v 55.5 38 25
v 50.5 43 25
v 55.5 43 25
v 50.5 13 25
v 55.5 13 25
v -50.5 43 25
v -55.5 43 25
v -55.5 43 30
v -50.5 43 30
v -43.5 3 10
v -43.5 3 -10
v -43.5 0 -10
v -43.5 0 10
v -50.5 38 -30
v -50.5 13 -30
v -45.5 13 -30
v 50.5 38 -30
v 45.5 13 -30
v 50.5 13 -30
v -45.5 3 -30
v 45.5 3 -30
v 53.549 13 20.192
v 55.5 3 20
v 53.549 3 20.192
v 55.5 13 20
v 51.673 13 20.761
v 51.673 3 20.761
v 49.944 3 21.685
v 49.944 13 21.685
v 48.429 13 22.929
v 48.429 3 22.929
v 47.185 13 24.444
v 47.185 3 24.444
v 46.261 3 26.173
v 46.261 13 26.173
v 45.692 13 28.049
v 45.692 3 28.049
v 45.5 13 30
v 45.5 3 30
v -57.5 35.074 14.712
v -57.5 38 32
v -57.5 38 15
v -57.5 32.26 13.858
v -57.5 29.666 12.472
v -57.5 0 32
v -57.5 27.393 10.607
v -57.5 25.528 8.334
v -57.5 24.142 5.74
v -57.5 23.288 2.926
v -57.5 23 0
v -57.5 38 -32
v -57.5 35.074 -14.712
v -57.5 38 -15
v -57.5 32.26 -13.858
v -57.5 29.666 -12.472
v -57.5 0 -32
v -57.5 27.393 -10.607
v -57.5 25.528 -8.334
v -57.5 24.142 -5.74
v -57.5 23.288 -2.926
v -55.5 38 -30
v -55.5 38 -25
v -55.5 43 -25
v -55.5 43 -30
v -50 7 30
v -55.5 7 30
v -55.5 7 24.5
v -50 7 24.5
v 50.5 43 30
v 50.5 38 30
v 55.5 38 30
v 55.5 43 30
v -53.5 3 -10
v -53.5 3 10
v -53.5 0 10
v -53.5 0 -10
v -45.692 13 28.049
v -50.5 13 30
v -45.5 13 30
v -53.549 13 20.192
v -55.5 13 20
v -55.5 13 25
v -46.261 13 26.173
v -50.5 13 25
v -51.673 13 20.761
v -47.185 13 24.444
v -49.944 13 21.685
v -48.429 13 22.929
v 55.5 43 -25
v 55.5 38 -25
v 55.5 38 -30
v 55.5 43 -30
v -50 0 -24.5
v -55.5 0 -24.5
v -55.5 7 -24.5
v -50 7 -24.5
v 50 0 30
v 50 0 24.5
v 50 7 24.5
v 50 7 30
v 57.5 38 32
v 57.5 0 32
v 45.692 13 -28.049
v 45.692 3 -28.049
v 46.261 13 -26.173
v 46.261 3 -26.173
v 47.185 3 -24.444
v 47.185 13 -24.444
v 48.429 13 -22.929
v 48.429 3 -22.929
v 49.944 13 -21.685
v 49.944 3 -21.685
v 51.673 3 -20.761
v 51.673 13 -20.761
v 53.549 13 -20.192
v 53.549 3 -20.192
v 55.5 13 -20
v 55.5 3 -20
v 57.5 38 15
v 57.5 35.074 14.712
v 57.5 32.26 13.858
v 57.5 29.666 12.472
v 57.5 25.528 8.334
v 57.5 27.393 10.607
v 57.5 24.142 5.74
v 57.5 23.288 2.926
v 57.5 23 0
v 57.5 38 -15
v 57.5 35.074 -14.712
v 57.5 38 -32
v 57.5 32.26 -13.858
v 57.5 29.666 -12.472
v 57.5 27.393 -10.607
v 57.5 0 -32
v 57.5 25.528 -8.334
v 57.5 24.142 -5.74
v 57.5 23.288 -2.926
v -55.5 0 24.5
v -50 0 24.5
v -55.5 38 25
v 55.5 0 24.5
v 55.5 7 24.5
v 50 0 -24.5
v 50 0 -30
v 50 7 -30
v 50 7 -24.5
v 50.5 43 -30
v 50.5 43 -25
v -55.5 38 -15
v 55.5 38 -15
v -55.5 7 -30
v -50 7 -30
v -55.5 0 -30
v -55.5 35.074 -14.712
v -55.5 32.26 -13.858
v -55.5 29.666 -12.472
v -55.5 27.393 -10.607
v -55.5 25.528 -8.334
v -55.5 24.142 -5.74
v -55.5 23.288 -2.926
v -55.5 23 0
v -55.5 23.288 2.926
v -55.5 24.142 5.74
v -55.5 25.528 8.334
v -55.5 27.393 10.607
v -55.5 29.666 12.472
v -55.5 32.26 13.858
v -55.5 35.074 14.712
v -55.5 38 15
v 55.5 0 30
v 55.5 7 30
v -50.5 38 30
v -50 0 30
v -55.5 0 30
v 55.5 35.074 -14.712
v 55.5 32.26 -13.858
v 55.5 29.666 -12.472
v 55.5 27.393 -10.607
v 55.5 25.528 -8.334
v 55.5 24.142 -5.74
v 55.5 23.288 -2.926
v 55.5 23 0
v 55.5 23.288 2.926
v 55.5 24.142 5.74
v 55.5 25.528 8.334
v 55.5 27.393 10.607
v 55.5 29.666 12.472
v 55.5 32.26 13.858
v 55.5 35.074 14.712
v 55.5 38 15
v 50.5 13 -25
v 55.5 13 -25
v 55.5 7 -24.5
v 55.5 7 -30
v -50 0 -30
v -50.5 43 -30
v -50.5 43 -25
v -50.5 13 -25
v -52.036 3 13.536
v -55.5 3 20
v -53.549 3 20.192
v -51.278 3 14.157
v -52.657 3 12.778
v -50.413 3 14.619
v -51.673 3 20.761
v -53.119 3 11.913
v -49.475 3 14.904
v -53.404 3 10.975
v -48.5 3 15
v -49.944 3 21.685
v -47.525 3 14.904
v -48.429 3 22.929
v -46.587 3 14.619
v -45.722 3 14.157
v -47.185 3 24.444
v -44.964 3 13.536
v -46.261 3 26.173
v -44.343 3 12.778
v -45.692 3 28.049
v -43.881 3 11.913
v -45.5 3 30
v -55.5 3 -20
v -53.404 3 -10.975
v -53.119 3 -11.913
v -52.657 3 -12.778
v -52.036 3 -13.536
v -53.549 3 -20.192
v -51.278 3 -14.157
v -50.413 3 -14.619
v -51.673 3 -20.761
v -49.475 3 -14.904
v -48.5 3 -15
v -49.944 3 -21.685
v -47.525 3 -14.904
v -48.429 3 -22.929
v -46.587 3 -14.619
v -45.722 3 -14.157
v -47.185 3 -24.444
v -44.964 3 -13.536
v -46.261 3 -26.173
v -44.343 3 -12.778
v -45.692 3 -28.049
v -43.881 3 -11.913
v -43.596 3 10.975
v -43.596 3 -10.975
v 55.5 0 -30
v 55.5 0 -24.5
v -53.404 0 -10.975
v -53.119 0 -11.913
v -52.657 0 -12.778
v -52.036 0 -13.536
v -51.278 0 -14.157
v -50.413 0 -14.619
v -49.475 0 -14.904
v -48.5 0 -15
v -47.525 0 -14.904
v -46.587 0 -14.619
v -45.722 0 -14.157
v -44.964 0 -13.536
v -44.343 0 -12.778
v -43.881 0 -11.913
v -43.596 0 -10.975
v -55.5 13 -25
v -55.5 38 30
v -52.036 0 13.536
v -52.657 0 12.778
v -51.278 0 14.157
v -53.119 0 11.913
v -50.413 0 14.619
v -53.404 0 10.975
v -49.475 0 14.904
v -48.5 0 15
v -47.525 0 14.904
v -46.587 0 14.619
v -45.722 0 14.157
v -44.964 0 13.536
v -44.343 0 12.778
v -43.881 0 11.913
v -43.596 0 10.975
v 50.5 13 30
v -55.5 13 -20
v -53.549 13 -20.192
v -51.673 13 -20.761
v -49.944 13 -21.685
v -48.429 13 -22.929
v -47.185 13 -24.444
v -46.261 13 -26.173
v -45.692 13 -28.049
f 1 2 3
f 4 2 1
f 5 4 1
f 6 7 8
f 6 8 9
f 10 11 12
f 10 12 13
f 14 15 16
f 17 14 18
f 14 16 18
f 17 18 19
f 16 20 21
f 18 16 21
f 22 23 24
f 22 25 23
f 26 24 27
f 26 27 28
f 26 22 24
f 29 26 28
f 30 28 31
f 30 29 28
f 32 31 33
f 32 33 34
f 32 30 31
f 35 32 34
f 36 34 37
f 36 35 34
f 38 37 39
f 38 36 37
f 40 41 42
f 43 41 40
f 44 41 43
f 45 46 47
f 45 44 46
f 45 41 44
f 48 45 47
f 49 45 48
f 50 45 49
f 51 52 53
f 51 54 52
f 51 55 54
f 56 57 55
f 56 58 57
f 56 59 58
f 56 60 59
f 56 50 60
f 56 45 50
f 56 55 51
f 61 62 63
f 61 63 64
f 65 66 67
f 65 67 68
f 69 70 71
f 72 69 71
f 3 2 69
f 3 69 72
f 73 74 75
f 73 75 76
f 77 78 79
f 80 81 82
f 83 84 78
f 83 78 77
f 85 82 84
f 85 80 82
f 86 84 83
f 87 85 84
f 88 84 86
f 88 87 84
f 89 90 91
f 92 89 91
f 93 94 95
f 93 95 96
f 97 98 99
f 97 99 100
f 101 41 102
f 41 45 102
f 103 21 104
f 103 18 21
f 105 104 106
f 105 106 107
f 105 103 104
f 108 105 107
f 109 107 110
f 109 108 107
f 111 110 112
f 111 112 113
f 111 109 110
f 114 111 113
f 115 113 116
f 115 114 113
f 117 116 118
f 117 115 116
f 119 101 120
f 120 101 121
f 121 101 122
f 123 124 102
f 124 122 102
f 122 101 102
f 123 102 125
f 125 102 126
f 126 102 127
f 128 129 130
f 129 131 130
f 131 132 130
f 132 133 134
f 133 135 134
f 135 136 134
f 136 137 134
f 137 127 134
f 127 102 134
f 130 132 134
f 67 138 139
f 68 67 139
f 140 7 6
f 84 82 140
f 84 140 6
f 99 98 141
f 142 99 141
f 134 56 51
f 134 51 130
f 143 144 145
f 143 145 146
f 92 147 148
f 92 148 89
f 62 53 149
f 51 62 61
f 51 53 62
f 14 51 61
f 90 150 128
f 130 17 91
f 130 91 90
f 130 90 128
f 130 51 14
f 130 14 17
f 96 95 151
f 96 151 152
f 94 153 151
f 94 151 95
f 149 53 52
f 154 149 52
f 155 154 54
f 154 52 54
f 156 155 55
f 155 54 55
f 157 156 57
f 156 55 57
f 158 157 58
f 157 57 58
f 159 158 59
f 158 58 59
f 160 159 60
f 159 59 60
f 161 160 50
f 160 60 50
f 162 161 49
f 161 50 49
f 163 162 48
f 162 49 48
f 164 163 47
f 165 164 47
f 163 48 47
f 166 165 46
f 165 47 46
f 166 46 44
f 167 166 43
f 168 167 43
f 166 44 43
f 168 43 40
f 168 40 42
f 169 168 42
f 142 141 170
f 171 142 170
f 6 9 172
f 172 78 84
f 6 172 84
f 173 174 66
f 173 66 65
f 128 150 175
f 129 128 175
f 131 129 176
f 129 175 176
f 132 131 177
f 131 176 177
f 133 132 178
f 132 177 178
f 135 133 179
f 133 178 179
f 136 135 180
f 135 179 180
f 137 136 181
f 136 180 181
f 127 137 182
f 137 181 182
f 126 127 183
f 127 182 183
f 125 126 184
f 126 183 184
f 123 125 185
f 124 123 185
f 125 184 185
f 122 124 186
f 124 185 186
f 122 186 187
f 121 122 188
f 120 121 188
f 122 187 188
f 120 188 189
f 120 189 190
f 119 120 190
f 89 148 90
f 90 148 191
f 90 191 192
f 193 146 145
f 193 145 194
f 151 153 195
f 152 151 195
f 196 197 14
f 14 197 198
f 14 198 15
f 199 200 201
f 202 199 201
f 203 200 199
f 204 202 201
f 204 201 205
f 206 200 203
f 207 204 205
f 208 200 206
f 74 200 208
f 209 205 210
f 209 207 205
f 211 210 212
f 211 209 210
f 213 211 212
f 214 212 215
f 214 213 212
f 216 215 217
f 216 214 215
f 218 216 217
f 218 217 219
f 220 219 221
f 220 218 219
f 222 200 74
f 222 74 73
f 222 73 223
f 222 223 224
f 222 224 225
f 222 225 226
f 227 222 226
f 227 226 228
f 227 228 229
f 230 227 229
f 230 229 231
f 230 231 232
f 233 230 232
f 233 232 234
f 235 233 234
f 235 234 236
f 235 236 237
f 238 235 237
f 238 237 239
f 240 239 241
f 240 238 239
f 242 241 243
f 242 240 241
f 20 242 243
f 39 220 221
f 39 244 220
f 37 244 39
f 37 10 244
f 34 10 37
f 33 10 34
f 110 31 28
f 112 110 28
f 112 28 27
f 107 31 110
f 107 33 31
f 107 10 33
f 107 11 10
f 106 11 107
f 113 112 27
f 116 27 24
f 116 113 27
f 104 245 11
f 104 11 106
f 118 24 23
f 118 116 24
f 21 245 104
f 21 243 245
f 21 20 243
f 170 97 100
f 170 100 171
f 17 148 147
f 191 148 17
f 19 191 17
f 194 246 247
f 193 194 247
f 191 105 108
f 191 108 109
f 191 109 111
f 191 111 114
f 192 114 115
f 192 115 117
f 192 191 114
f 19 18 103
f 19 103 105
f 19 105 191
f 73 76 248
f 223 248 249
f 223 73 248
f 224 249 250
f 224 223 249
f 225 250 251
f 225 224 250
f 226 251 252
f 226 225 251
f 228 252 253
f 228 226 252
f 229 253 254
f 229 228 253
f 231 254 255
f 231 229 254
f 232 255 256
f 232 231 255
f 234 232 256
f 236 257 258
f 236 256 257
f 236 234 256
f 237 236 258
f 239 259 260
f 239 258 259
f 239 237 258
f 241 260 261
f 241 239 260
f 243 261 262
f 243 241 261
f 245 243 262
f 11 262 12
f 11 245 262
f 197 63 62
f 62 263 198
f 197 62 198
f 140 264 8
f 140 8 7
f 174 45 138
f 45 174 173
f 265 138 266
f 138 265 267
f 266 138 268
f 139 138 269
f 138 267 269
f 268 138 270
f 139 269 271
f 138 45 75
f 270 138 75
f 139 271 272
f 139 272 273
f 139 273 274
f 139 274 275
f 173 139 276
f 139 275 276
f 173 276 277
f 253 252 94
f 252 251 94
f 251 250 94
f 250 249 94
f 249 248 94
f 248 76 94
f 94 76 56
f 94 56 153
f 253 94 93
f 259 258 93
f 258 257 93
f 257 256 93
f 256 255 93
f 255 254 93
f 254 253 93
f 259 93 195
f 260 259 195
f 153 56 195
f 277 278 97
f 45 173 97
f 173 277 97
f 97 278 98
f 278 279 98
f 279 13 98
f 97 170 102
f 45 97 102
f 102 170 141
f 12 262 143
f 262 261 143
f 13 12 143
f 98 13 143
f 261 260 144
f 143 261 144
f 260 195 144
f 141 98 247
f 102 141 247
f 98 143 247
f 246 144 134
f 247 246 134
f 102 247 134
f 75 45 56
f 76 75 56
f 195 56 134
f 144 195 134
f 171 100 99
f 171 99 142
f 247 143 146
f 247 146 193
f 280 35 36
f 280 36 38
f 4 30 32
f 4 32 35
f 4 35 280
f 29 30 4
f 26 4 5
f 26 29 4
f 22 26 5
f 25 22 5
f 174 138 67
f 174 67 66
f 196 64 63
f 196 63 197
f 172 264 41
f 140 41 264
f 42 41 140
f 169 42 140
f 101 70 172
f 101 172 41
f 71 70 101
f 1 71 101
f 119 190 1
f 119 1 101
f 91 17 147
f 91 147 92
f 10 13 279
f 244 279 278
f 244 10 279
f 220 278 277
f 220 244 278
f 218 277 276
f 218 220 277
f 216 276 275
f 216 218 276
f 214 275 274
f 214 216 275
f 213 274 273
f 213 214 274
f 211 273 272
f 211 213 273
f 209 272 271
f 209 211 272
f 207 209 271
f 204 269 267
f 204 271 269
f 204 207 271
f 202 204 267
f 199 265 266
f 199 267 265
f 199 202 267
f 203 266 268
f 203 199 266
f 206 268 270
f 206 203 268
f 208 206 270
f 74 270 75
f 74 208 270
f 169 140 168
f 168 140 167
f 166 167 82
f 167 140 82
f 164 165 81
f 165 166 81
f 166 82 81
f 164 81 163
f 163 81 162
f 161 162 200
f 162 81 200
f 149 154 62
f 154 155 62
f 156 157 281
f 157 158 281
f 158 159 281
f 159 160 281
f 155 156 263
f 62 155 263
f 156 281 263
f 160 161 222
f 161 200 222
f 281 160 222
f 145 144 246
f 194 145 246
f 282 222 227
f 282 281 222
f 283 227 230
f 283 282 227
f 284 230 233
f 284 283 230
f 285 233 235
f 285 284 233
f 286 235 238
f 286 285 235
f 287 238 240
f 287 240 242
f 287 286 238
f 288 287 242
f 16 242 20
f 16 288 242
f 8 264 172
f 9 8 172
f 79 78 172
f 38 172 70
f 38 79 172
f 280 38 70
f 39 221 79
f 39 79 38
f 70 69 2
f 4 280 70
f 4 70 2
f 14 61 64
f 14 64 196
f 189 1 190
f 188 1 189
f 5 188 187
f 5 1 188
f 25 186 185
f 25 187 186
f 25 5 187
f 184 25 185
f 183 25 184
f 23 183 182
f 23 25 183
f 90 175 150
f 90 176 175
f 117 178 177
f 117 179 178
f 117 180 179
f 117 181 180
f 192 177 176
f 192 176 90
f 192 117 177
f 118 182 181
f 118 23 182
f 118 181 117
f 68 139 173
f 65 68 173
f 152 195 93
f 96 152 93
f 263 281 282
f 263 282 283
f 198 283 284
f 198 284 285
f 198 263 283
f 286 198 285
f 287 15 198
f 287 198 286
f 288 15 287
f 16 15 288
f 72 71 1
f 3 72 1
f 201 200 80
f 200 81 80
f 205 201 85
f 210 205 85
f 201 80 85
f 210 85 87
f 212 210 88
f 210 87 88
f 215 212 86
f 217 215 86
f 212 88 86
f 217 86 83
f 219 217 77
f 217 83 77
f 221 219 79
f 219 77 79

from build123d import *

# Parameters (mm, degrees)
SKETCH1_W                = 115
SKETCH1_H                = 64
BOSS_EXTRUDE1_DEPTH      = 3
SKETCH2_W                = 115
SKETCH2_H                = 64
SKETCH2_W_2              = 111
SKETCH2_H_2              = 60
BOSS_EXTRUDE2_DEPTH      = 35
BOSS_EXTRUDE9_DEPTH      = 5
BOSS_EXTRUDE9_DEPTH_BACK = 37
SKETCH12_W               = 5
SKETCH12_H               = 5
CUT_EXTRUDE6_DEPTH       = 78.008116455
BOSS_EXTRUDE11_DEPTH     = 10
SKETCH19_W               = 5.5
SKETCH19_H               = 5.5
CUT_EXTRUDE7_DEPTH       = 7
FILLET2_R                = 10
SKETCH20_R               = 15
CUT_EXTRUDE8_DEPTH       = 127.877894056


with BuildPart() as part:
    # Sketch1 → Boss-Extrude1 (new body)
    with BuildSketch(Plane(origin=(0, 0, 0), x_dir=(1, 0, 0), z_dir=(0, 1, 0))):
        Rectangle(SKETCH1_W, SKETCH1_H)
    extrude(amount=BOSS_EXTRUDE1_DEPTH)

    # Sketch2 → Boss-Extrude2 (add)
    with BuildSketch(Plane(origin=(0, 3, 0), x_dir=(1, 0, 0), z_dir=(0, 1, 0))):
        Rectangle(SKETCH2_W, SKETCH2_H)
        Rectangle(SKETCH2_W_2, SKETCH2_H_2, mode=Mode.SUBTRACT)
    extrude(amount=BOSS_EXTRUDE2_DEPTH)

    # Sketch12 → Boss-Extrude9 (add, two sides: drawn at the far end of the back side and taken through both)
    with BuildSketch(Plane(origin=(0, 38, 0), x_dir=(1, 0, 0), z_dir=(0, 1, 0)).offset(-BOSS_EXTRUDE9_DEPTH_BACK)):
        with Locations((-53, 27.5)):
            Rectangle(SKETCH12_W, SKETCH12_H)
        with Locations((53, 27.5)):
            Rectangle(SKETCH12_W, SKETCH12_H)
        with Locations((53, -27.5)):
            Rectangle(SKETCH12_W, SKETCH12_H)
        with Locations((-53, -27.5)):
            Rectangle(SKETCH12_W, SKETCH12_H)
    extrude(amount=BOSS_EXTRUDE9_DEPTH + BOSS_EXTRUDE9_DEPTH_BACK)

    # Sketch14 → Cut-Extrude6 (cut, through all)
    with BuildSketch(Plane(origin=(0, 3, 0), x_dir=(1, 0, 0), z_dir=(0, 1, 0))):
        with BuildLine():
            Line((-53.5, -10), (-53.5, 10))
            ThreePointArc((-53.5, 10), (-48.5, 15), (-43.5, 10))
            Line((-43.5, 10), (-43.5, -10))
            ThreePointArc((-43.5, -10), (-48.5, -15), (-53.5, -10))
        make_face()
    extrude(amount=-CUT_EXTRUDE6_DEPTH, mode=Mode.SUBTRACT)

    # Sketch17 → Boss-Extrude11 (add)
    with BuildSketch(Plane(origin=(0, 3, 0), x_dir=(1, 0, 0), z_dir=(0, 1, 0))):
        Polygon((-45.5, 30), (-50.5, 30), (-50.5, 25), (-55.5, 25), (-55.5, 20), (-45.5, 20), align=None)
        Polygon((50.5, 30), (45.5, 30), (45.5, 20), (55.5, 20), (55.5, 25), (50.5, 25), align=None)
        Polygon((55.5, -25), (55.5, -20), (45.5, -20), (45.5, -30), (50.5, -30), (50.5, -25), align=None)
        Polygon((-45.5, -20), (-55.5, -20), (-55.5, -25), (-50.5, -25), (-50.5, -30), (-45.5, -30), align=None)
    extrude(amount=BOSS_EXTRUDE11_DEPTH)

    # Sketch19 → Cut-Extrude7 (cut)
    with BuildSketch(Plane.XZ):
        with Locations((-52.75, 27.25)):
            Rectangle(SKETCH19_W, SKETCH19_H)
        with Locations((52.75, 27.25)):
            Rectangle(SKETCH19_W, SKETCH19_H)
        with Locations((52.75, -27.25)):
            Rectangle(SKETCH19_W, SKETCH19_H)
        with Locations((-52.75, -27.25)):
            Rectangle(SKETCH19_W, SKETCH19_H)
    extrude(amount=-CUT_EXTRUDE7_DEPTH, mode=Mode.SUBTRACT)

    # Fillet2
    fillet2_edges = [part.edges().sort_by_distance(p)[0] for p in [
        (-45.5, 8, 20),
        (45.5, 8, -20),
        (45.5, 8, 20),
        (-45.5, 8, -20),
    ]]
    fillet(fillet2_edges, radius=FILLET2_R - 0.0001)  # a hair under: the kernel refuses the full size

    # Sketch20 → Cut-Extrude8 (cut, through all)
    with BuildSketch(Plane.ZY.offset(57.5)):
        with Locations((0, 38)):
            Circle(SKETCH20_R)
    extrude(amount=-CUT_EXTRUDE8_DEPTH, mode=Mode.SUBTRACT)


solid = part.part
